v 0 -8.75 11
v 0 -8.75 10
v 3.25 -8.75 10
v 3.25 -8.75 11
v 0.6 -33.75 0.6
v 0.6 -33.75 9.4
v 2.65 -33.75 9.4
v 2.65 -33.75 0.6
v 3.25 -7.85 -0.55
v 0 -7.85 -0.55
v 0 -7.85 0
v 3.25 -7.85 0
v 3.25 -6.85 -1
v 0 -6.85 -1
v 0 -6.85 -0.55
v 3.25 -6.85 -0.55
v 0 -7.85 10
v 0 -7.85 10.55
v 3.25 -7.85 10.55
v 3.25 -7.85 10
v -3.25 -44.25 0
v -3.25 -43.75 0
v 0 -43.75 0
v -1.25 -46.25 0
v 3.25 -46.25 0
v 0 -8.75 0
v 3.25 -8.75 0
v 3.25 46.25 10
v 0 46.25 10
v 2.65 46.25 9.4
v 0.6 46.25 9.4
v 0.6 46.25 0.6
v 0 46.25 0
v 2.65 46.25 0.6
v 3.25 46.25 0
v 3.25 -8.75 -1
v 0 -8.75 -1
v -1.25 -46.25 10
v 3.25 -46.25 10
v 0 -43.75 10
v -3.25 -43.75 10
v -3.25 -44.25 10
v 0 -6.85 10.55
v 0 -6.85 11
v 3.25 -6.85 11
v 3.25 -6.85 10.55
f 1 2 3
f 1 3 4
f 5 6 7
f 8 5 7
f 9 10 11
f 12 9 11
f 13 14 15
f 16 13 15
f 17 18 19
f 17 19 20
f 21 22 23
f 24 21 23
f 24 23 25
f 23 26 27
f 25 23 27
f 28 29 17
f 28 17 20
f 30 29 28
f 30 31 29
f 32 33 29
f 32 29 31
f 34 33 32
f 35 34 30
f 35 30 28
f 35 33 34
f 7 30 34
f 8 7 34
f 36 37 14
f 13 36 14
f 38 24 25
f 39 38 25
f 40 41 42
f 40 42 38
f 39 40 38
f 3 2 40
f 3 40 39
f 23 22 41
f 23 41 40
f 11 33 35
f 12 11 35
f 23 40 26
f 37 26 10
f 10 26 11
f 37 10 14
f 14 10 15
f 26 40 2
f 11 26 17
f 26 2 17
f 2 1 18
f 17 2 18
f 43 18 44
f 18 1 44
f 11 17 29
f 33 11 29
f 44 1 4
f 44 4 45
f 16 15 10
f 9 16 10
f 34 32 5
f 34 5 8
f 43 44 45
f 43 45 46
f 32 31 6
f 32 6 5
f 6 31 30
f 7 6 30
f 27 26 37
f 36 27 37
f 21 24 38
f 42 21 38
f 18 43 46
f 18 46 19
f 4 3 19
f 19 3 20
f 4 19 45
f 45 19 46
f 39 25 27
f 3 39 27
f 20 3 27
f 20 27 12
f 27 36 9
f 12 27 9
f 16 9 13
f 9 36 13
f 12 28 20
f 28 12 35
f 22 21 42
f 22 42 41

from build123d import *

# Parameters (mm, degrees)
SKETCH1_W           = 6.5
SKETCH1_H           = 92.5
BOSS_EXTRUDE1_DEPTH = 10
SKETCH2_W           = 3.25
SKETCH2_H           = 90
CUT_EXTRUDE1_DEPTH  = 10
CHAMFER1_SIZE       = 2
BOSS_EXTRUDE2_DEPTH = 3.25
SKETCH6_W           = 2.05
SKETCH6_H           = 8.8
CUT_EXTRUDE2_DEPTH  = 80


with BuildPart() as part:
    # Sketch1 → Boss-Extrude1 (new body)
    with BuildSketch(Plane.XY):
        Rectangle(SKETCH1_W, SKETCH1_H)
    extrude(amount=BOSS_EXTRUDE1_DEPTH)

    # Sketch2 → Cut-Extrude1 (cut)
    with BuildSketch(Plane.XY.offset(10)):
        with Locations((-1.625, 1.25)):
            Rectangle(SKETCH2_W, SKETCH2_H)
    extrude(amount=-CUT_EXTRUDE1_DEPTH, mode=Mode.SUBTRACT)

    # Chamfer1
    chamfer1_edges = [part.edges().sort_by_distance(p)[0] for p in [
        (-3.25, -46.25, 5),
    ]]
    chamfer(chamfer1_edges, length=CHAMFER1_SIZE)

    # Sketch4 → Boss-Extrude2 (add)
    with BuildSketch(Plane.ZY):
        Polygon((10, -8.75), (11, -8.75), (11, -6.85), (10.55, -6.85), (10.55, -7.85), (10, -7.85), align=None)
    boss_extrude2 = extrude(amount=-BOSS_EXTRUDE2_DEPTH)

    # Mirror1: Boss-Extrude2 across plane
    add(boss_extrude2.mirror(Plane.XY.offset(5)))

    # Sketch6 → Cut-Extrude2 (cut)
    with BuildSketch(Plane(origin=(0, 46.25, 0), x_dir=(1, 0, 0), z_dir=(0, 1, 0))):
        with Locations((1.625, -5)):
            Rectangle(SKETCH6_W, SKETCH6_H)
    extrude(amount=-CUT_EXTRUDE2_DEPTH, mode=Mode.SUBTRACT)


solid = part.part
